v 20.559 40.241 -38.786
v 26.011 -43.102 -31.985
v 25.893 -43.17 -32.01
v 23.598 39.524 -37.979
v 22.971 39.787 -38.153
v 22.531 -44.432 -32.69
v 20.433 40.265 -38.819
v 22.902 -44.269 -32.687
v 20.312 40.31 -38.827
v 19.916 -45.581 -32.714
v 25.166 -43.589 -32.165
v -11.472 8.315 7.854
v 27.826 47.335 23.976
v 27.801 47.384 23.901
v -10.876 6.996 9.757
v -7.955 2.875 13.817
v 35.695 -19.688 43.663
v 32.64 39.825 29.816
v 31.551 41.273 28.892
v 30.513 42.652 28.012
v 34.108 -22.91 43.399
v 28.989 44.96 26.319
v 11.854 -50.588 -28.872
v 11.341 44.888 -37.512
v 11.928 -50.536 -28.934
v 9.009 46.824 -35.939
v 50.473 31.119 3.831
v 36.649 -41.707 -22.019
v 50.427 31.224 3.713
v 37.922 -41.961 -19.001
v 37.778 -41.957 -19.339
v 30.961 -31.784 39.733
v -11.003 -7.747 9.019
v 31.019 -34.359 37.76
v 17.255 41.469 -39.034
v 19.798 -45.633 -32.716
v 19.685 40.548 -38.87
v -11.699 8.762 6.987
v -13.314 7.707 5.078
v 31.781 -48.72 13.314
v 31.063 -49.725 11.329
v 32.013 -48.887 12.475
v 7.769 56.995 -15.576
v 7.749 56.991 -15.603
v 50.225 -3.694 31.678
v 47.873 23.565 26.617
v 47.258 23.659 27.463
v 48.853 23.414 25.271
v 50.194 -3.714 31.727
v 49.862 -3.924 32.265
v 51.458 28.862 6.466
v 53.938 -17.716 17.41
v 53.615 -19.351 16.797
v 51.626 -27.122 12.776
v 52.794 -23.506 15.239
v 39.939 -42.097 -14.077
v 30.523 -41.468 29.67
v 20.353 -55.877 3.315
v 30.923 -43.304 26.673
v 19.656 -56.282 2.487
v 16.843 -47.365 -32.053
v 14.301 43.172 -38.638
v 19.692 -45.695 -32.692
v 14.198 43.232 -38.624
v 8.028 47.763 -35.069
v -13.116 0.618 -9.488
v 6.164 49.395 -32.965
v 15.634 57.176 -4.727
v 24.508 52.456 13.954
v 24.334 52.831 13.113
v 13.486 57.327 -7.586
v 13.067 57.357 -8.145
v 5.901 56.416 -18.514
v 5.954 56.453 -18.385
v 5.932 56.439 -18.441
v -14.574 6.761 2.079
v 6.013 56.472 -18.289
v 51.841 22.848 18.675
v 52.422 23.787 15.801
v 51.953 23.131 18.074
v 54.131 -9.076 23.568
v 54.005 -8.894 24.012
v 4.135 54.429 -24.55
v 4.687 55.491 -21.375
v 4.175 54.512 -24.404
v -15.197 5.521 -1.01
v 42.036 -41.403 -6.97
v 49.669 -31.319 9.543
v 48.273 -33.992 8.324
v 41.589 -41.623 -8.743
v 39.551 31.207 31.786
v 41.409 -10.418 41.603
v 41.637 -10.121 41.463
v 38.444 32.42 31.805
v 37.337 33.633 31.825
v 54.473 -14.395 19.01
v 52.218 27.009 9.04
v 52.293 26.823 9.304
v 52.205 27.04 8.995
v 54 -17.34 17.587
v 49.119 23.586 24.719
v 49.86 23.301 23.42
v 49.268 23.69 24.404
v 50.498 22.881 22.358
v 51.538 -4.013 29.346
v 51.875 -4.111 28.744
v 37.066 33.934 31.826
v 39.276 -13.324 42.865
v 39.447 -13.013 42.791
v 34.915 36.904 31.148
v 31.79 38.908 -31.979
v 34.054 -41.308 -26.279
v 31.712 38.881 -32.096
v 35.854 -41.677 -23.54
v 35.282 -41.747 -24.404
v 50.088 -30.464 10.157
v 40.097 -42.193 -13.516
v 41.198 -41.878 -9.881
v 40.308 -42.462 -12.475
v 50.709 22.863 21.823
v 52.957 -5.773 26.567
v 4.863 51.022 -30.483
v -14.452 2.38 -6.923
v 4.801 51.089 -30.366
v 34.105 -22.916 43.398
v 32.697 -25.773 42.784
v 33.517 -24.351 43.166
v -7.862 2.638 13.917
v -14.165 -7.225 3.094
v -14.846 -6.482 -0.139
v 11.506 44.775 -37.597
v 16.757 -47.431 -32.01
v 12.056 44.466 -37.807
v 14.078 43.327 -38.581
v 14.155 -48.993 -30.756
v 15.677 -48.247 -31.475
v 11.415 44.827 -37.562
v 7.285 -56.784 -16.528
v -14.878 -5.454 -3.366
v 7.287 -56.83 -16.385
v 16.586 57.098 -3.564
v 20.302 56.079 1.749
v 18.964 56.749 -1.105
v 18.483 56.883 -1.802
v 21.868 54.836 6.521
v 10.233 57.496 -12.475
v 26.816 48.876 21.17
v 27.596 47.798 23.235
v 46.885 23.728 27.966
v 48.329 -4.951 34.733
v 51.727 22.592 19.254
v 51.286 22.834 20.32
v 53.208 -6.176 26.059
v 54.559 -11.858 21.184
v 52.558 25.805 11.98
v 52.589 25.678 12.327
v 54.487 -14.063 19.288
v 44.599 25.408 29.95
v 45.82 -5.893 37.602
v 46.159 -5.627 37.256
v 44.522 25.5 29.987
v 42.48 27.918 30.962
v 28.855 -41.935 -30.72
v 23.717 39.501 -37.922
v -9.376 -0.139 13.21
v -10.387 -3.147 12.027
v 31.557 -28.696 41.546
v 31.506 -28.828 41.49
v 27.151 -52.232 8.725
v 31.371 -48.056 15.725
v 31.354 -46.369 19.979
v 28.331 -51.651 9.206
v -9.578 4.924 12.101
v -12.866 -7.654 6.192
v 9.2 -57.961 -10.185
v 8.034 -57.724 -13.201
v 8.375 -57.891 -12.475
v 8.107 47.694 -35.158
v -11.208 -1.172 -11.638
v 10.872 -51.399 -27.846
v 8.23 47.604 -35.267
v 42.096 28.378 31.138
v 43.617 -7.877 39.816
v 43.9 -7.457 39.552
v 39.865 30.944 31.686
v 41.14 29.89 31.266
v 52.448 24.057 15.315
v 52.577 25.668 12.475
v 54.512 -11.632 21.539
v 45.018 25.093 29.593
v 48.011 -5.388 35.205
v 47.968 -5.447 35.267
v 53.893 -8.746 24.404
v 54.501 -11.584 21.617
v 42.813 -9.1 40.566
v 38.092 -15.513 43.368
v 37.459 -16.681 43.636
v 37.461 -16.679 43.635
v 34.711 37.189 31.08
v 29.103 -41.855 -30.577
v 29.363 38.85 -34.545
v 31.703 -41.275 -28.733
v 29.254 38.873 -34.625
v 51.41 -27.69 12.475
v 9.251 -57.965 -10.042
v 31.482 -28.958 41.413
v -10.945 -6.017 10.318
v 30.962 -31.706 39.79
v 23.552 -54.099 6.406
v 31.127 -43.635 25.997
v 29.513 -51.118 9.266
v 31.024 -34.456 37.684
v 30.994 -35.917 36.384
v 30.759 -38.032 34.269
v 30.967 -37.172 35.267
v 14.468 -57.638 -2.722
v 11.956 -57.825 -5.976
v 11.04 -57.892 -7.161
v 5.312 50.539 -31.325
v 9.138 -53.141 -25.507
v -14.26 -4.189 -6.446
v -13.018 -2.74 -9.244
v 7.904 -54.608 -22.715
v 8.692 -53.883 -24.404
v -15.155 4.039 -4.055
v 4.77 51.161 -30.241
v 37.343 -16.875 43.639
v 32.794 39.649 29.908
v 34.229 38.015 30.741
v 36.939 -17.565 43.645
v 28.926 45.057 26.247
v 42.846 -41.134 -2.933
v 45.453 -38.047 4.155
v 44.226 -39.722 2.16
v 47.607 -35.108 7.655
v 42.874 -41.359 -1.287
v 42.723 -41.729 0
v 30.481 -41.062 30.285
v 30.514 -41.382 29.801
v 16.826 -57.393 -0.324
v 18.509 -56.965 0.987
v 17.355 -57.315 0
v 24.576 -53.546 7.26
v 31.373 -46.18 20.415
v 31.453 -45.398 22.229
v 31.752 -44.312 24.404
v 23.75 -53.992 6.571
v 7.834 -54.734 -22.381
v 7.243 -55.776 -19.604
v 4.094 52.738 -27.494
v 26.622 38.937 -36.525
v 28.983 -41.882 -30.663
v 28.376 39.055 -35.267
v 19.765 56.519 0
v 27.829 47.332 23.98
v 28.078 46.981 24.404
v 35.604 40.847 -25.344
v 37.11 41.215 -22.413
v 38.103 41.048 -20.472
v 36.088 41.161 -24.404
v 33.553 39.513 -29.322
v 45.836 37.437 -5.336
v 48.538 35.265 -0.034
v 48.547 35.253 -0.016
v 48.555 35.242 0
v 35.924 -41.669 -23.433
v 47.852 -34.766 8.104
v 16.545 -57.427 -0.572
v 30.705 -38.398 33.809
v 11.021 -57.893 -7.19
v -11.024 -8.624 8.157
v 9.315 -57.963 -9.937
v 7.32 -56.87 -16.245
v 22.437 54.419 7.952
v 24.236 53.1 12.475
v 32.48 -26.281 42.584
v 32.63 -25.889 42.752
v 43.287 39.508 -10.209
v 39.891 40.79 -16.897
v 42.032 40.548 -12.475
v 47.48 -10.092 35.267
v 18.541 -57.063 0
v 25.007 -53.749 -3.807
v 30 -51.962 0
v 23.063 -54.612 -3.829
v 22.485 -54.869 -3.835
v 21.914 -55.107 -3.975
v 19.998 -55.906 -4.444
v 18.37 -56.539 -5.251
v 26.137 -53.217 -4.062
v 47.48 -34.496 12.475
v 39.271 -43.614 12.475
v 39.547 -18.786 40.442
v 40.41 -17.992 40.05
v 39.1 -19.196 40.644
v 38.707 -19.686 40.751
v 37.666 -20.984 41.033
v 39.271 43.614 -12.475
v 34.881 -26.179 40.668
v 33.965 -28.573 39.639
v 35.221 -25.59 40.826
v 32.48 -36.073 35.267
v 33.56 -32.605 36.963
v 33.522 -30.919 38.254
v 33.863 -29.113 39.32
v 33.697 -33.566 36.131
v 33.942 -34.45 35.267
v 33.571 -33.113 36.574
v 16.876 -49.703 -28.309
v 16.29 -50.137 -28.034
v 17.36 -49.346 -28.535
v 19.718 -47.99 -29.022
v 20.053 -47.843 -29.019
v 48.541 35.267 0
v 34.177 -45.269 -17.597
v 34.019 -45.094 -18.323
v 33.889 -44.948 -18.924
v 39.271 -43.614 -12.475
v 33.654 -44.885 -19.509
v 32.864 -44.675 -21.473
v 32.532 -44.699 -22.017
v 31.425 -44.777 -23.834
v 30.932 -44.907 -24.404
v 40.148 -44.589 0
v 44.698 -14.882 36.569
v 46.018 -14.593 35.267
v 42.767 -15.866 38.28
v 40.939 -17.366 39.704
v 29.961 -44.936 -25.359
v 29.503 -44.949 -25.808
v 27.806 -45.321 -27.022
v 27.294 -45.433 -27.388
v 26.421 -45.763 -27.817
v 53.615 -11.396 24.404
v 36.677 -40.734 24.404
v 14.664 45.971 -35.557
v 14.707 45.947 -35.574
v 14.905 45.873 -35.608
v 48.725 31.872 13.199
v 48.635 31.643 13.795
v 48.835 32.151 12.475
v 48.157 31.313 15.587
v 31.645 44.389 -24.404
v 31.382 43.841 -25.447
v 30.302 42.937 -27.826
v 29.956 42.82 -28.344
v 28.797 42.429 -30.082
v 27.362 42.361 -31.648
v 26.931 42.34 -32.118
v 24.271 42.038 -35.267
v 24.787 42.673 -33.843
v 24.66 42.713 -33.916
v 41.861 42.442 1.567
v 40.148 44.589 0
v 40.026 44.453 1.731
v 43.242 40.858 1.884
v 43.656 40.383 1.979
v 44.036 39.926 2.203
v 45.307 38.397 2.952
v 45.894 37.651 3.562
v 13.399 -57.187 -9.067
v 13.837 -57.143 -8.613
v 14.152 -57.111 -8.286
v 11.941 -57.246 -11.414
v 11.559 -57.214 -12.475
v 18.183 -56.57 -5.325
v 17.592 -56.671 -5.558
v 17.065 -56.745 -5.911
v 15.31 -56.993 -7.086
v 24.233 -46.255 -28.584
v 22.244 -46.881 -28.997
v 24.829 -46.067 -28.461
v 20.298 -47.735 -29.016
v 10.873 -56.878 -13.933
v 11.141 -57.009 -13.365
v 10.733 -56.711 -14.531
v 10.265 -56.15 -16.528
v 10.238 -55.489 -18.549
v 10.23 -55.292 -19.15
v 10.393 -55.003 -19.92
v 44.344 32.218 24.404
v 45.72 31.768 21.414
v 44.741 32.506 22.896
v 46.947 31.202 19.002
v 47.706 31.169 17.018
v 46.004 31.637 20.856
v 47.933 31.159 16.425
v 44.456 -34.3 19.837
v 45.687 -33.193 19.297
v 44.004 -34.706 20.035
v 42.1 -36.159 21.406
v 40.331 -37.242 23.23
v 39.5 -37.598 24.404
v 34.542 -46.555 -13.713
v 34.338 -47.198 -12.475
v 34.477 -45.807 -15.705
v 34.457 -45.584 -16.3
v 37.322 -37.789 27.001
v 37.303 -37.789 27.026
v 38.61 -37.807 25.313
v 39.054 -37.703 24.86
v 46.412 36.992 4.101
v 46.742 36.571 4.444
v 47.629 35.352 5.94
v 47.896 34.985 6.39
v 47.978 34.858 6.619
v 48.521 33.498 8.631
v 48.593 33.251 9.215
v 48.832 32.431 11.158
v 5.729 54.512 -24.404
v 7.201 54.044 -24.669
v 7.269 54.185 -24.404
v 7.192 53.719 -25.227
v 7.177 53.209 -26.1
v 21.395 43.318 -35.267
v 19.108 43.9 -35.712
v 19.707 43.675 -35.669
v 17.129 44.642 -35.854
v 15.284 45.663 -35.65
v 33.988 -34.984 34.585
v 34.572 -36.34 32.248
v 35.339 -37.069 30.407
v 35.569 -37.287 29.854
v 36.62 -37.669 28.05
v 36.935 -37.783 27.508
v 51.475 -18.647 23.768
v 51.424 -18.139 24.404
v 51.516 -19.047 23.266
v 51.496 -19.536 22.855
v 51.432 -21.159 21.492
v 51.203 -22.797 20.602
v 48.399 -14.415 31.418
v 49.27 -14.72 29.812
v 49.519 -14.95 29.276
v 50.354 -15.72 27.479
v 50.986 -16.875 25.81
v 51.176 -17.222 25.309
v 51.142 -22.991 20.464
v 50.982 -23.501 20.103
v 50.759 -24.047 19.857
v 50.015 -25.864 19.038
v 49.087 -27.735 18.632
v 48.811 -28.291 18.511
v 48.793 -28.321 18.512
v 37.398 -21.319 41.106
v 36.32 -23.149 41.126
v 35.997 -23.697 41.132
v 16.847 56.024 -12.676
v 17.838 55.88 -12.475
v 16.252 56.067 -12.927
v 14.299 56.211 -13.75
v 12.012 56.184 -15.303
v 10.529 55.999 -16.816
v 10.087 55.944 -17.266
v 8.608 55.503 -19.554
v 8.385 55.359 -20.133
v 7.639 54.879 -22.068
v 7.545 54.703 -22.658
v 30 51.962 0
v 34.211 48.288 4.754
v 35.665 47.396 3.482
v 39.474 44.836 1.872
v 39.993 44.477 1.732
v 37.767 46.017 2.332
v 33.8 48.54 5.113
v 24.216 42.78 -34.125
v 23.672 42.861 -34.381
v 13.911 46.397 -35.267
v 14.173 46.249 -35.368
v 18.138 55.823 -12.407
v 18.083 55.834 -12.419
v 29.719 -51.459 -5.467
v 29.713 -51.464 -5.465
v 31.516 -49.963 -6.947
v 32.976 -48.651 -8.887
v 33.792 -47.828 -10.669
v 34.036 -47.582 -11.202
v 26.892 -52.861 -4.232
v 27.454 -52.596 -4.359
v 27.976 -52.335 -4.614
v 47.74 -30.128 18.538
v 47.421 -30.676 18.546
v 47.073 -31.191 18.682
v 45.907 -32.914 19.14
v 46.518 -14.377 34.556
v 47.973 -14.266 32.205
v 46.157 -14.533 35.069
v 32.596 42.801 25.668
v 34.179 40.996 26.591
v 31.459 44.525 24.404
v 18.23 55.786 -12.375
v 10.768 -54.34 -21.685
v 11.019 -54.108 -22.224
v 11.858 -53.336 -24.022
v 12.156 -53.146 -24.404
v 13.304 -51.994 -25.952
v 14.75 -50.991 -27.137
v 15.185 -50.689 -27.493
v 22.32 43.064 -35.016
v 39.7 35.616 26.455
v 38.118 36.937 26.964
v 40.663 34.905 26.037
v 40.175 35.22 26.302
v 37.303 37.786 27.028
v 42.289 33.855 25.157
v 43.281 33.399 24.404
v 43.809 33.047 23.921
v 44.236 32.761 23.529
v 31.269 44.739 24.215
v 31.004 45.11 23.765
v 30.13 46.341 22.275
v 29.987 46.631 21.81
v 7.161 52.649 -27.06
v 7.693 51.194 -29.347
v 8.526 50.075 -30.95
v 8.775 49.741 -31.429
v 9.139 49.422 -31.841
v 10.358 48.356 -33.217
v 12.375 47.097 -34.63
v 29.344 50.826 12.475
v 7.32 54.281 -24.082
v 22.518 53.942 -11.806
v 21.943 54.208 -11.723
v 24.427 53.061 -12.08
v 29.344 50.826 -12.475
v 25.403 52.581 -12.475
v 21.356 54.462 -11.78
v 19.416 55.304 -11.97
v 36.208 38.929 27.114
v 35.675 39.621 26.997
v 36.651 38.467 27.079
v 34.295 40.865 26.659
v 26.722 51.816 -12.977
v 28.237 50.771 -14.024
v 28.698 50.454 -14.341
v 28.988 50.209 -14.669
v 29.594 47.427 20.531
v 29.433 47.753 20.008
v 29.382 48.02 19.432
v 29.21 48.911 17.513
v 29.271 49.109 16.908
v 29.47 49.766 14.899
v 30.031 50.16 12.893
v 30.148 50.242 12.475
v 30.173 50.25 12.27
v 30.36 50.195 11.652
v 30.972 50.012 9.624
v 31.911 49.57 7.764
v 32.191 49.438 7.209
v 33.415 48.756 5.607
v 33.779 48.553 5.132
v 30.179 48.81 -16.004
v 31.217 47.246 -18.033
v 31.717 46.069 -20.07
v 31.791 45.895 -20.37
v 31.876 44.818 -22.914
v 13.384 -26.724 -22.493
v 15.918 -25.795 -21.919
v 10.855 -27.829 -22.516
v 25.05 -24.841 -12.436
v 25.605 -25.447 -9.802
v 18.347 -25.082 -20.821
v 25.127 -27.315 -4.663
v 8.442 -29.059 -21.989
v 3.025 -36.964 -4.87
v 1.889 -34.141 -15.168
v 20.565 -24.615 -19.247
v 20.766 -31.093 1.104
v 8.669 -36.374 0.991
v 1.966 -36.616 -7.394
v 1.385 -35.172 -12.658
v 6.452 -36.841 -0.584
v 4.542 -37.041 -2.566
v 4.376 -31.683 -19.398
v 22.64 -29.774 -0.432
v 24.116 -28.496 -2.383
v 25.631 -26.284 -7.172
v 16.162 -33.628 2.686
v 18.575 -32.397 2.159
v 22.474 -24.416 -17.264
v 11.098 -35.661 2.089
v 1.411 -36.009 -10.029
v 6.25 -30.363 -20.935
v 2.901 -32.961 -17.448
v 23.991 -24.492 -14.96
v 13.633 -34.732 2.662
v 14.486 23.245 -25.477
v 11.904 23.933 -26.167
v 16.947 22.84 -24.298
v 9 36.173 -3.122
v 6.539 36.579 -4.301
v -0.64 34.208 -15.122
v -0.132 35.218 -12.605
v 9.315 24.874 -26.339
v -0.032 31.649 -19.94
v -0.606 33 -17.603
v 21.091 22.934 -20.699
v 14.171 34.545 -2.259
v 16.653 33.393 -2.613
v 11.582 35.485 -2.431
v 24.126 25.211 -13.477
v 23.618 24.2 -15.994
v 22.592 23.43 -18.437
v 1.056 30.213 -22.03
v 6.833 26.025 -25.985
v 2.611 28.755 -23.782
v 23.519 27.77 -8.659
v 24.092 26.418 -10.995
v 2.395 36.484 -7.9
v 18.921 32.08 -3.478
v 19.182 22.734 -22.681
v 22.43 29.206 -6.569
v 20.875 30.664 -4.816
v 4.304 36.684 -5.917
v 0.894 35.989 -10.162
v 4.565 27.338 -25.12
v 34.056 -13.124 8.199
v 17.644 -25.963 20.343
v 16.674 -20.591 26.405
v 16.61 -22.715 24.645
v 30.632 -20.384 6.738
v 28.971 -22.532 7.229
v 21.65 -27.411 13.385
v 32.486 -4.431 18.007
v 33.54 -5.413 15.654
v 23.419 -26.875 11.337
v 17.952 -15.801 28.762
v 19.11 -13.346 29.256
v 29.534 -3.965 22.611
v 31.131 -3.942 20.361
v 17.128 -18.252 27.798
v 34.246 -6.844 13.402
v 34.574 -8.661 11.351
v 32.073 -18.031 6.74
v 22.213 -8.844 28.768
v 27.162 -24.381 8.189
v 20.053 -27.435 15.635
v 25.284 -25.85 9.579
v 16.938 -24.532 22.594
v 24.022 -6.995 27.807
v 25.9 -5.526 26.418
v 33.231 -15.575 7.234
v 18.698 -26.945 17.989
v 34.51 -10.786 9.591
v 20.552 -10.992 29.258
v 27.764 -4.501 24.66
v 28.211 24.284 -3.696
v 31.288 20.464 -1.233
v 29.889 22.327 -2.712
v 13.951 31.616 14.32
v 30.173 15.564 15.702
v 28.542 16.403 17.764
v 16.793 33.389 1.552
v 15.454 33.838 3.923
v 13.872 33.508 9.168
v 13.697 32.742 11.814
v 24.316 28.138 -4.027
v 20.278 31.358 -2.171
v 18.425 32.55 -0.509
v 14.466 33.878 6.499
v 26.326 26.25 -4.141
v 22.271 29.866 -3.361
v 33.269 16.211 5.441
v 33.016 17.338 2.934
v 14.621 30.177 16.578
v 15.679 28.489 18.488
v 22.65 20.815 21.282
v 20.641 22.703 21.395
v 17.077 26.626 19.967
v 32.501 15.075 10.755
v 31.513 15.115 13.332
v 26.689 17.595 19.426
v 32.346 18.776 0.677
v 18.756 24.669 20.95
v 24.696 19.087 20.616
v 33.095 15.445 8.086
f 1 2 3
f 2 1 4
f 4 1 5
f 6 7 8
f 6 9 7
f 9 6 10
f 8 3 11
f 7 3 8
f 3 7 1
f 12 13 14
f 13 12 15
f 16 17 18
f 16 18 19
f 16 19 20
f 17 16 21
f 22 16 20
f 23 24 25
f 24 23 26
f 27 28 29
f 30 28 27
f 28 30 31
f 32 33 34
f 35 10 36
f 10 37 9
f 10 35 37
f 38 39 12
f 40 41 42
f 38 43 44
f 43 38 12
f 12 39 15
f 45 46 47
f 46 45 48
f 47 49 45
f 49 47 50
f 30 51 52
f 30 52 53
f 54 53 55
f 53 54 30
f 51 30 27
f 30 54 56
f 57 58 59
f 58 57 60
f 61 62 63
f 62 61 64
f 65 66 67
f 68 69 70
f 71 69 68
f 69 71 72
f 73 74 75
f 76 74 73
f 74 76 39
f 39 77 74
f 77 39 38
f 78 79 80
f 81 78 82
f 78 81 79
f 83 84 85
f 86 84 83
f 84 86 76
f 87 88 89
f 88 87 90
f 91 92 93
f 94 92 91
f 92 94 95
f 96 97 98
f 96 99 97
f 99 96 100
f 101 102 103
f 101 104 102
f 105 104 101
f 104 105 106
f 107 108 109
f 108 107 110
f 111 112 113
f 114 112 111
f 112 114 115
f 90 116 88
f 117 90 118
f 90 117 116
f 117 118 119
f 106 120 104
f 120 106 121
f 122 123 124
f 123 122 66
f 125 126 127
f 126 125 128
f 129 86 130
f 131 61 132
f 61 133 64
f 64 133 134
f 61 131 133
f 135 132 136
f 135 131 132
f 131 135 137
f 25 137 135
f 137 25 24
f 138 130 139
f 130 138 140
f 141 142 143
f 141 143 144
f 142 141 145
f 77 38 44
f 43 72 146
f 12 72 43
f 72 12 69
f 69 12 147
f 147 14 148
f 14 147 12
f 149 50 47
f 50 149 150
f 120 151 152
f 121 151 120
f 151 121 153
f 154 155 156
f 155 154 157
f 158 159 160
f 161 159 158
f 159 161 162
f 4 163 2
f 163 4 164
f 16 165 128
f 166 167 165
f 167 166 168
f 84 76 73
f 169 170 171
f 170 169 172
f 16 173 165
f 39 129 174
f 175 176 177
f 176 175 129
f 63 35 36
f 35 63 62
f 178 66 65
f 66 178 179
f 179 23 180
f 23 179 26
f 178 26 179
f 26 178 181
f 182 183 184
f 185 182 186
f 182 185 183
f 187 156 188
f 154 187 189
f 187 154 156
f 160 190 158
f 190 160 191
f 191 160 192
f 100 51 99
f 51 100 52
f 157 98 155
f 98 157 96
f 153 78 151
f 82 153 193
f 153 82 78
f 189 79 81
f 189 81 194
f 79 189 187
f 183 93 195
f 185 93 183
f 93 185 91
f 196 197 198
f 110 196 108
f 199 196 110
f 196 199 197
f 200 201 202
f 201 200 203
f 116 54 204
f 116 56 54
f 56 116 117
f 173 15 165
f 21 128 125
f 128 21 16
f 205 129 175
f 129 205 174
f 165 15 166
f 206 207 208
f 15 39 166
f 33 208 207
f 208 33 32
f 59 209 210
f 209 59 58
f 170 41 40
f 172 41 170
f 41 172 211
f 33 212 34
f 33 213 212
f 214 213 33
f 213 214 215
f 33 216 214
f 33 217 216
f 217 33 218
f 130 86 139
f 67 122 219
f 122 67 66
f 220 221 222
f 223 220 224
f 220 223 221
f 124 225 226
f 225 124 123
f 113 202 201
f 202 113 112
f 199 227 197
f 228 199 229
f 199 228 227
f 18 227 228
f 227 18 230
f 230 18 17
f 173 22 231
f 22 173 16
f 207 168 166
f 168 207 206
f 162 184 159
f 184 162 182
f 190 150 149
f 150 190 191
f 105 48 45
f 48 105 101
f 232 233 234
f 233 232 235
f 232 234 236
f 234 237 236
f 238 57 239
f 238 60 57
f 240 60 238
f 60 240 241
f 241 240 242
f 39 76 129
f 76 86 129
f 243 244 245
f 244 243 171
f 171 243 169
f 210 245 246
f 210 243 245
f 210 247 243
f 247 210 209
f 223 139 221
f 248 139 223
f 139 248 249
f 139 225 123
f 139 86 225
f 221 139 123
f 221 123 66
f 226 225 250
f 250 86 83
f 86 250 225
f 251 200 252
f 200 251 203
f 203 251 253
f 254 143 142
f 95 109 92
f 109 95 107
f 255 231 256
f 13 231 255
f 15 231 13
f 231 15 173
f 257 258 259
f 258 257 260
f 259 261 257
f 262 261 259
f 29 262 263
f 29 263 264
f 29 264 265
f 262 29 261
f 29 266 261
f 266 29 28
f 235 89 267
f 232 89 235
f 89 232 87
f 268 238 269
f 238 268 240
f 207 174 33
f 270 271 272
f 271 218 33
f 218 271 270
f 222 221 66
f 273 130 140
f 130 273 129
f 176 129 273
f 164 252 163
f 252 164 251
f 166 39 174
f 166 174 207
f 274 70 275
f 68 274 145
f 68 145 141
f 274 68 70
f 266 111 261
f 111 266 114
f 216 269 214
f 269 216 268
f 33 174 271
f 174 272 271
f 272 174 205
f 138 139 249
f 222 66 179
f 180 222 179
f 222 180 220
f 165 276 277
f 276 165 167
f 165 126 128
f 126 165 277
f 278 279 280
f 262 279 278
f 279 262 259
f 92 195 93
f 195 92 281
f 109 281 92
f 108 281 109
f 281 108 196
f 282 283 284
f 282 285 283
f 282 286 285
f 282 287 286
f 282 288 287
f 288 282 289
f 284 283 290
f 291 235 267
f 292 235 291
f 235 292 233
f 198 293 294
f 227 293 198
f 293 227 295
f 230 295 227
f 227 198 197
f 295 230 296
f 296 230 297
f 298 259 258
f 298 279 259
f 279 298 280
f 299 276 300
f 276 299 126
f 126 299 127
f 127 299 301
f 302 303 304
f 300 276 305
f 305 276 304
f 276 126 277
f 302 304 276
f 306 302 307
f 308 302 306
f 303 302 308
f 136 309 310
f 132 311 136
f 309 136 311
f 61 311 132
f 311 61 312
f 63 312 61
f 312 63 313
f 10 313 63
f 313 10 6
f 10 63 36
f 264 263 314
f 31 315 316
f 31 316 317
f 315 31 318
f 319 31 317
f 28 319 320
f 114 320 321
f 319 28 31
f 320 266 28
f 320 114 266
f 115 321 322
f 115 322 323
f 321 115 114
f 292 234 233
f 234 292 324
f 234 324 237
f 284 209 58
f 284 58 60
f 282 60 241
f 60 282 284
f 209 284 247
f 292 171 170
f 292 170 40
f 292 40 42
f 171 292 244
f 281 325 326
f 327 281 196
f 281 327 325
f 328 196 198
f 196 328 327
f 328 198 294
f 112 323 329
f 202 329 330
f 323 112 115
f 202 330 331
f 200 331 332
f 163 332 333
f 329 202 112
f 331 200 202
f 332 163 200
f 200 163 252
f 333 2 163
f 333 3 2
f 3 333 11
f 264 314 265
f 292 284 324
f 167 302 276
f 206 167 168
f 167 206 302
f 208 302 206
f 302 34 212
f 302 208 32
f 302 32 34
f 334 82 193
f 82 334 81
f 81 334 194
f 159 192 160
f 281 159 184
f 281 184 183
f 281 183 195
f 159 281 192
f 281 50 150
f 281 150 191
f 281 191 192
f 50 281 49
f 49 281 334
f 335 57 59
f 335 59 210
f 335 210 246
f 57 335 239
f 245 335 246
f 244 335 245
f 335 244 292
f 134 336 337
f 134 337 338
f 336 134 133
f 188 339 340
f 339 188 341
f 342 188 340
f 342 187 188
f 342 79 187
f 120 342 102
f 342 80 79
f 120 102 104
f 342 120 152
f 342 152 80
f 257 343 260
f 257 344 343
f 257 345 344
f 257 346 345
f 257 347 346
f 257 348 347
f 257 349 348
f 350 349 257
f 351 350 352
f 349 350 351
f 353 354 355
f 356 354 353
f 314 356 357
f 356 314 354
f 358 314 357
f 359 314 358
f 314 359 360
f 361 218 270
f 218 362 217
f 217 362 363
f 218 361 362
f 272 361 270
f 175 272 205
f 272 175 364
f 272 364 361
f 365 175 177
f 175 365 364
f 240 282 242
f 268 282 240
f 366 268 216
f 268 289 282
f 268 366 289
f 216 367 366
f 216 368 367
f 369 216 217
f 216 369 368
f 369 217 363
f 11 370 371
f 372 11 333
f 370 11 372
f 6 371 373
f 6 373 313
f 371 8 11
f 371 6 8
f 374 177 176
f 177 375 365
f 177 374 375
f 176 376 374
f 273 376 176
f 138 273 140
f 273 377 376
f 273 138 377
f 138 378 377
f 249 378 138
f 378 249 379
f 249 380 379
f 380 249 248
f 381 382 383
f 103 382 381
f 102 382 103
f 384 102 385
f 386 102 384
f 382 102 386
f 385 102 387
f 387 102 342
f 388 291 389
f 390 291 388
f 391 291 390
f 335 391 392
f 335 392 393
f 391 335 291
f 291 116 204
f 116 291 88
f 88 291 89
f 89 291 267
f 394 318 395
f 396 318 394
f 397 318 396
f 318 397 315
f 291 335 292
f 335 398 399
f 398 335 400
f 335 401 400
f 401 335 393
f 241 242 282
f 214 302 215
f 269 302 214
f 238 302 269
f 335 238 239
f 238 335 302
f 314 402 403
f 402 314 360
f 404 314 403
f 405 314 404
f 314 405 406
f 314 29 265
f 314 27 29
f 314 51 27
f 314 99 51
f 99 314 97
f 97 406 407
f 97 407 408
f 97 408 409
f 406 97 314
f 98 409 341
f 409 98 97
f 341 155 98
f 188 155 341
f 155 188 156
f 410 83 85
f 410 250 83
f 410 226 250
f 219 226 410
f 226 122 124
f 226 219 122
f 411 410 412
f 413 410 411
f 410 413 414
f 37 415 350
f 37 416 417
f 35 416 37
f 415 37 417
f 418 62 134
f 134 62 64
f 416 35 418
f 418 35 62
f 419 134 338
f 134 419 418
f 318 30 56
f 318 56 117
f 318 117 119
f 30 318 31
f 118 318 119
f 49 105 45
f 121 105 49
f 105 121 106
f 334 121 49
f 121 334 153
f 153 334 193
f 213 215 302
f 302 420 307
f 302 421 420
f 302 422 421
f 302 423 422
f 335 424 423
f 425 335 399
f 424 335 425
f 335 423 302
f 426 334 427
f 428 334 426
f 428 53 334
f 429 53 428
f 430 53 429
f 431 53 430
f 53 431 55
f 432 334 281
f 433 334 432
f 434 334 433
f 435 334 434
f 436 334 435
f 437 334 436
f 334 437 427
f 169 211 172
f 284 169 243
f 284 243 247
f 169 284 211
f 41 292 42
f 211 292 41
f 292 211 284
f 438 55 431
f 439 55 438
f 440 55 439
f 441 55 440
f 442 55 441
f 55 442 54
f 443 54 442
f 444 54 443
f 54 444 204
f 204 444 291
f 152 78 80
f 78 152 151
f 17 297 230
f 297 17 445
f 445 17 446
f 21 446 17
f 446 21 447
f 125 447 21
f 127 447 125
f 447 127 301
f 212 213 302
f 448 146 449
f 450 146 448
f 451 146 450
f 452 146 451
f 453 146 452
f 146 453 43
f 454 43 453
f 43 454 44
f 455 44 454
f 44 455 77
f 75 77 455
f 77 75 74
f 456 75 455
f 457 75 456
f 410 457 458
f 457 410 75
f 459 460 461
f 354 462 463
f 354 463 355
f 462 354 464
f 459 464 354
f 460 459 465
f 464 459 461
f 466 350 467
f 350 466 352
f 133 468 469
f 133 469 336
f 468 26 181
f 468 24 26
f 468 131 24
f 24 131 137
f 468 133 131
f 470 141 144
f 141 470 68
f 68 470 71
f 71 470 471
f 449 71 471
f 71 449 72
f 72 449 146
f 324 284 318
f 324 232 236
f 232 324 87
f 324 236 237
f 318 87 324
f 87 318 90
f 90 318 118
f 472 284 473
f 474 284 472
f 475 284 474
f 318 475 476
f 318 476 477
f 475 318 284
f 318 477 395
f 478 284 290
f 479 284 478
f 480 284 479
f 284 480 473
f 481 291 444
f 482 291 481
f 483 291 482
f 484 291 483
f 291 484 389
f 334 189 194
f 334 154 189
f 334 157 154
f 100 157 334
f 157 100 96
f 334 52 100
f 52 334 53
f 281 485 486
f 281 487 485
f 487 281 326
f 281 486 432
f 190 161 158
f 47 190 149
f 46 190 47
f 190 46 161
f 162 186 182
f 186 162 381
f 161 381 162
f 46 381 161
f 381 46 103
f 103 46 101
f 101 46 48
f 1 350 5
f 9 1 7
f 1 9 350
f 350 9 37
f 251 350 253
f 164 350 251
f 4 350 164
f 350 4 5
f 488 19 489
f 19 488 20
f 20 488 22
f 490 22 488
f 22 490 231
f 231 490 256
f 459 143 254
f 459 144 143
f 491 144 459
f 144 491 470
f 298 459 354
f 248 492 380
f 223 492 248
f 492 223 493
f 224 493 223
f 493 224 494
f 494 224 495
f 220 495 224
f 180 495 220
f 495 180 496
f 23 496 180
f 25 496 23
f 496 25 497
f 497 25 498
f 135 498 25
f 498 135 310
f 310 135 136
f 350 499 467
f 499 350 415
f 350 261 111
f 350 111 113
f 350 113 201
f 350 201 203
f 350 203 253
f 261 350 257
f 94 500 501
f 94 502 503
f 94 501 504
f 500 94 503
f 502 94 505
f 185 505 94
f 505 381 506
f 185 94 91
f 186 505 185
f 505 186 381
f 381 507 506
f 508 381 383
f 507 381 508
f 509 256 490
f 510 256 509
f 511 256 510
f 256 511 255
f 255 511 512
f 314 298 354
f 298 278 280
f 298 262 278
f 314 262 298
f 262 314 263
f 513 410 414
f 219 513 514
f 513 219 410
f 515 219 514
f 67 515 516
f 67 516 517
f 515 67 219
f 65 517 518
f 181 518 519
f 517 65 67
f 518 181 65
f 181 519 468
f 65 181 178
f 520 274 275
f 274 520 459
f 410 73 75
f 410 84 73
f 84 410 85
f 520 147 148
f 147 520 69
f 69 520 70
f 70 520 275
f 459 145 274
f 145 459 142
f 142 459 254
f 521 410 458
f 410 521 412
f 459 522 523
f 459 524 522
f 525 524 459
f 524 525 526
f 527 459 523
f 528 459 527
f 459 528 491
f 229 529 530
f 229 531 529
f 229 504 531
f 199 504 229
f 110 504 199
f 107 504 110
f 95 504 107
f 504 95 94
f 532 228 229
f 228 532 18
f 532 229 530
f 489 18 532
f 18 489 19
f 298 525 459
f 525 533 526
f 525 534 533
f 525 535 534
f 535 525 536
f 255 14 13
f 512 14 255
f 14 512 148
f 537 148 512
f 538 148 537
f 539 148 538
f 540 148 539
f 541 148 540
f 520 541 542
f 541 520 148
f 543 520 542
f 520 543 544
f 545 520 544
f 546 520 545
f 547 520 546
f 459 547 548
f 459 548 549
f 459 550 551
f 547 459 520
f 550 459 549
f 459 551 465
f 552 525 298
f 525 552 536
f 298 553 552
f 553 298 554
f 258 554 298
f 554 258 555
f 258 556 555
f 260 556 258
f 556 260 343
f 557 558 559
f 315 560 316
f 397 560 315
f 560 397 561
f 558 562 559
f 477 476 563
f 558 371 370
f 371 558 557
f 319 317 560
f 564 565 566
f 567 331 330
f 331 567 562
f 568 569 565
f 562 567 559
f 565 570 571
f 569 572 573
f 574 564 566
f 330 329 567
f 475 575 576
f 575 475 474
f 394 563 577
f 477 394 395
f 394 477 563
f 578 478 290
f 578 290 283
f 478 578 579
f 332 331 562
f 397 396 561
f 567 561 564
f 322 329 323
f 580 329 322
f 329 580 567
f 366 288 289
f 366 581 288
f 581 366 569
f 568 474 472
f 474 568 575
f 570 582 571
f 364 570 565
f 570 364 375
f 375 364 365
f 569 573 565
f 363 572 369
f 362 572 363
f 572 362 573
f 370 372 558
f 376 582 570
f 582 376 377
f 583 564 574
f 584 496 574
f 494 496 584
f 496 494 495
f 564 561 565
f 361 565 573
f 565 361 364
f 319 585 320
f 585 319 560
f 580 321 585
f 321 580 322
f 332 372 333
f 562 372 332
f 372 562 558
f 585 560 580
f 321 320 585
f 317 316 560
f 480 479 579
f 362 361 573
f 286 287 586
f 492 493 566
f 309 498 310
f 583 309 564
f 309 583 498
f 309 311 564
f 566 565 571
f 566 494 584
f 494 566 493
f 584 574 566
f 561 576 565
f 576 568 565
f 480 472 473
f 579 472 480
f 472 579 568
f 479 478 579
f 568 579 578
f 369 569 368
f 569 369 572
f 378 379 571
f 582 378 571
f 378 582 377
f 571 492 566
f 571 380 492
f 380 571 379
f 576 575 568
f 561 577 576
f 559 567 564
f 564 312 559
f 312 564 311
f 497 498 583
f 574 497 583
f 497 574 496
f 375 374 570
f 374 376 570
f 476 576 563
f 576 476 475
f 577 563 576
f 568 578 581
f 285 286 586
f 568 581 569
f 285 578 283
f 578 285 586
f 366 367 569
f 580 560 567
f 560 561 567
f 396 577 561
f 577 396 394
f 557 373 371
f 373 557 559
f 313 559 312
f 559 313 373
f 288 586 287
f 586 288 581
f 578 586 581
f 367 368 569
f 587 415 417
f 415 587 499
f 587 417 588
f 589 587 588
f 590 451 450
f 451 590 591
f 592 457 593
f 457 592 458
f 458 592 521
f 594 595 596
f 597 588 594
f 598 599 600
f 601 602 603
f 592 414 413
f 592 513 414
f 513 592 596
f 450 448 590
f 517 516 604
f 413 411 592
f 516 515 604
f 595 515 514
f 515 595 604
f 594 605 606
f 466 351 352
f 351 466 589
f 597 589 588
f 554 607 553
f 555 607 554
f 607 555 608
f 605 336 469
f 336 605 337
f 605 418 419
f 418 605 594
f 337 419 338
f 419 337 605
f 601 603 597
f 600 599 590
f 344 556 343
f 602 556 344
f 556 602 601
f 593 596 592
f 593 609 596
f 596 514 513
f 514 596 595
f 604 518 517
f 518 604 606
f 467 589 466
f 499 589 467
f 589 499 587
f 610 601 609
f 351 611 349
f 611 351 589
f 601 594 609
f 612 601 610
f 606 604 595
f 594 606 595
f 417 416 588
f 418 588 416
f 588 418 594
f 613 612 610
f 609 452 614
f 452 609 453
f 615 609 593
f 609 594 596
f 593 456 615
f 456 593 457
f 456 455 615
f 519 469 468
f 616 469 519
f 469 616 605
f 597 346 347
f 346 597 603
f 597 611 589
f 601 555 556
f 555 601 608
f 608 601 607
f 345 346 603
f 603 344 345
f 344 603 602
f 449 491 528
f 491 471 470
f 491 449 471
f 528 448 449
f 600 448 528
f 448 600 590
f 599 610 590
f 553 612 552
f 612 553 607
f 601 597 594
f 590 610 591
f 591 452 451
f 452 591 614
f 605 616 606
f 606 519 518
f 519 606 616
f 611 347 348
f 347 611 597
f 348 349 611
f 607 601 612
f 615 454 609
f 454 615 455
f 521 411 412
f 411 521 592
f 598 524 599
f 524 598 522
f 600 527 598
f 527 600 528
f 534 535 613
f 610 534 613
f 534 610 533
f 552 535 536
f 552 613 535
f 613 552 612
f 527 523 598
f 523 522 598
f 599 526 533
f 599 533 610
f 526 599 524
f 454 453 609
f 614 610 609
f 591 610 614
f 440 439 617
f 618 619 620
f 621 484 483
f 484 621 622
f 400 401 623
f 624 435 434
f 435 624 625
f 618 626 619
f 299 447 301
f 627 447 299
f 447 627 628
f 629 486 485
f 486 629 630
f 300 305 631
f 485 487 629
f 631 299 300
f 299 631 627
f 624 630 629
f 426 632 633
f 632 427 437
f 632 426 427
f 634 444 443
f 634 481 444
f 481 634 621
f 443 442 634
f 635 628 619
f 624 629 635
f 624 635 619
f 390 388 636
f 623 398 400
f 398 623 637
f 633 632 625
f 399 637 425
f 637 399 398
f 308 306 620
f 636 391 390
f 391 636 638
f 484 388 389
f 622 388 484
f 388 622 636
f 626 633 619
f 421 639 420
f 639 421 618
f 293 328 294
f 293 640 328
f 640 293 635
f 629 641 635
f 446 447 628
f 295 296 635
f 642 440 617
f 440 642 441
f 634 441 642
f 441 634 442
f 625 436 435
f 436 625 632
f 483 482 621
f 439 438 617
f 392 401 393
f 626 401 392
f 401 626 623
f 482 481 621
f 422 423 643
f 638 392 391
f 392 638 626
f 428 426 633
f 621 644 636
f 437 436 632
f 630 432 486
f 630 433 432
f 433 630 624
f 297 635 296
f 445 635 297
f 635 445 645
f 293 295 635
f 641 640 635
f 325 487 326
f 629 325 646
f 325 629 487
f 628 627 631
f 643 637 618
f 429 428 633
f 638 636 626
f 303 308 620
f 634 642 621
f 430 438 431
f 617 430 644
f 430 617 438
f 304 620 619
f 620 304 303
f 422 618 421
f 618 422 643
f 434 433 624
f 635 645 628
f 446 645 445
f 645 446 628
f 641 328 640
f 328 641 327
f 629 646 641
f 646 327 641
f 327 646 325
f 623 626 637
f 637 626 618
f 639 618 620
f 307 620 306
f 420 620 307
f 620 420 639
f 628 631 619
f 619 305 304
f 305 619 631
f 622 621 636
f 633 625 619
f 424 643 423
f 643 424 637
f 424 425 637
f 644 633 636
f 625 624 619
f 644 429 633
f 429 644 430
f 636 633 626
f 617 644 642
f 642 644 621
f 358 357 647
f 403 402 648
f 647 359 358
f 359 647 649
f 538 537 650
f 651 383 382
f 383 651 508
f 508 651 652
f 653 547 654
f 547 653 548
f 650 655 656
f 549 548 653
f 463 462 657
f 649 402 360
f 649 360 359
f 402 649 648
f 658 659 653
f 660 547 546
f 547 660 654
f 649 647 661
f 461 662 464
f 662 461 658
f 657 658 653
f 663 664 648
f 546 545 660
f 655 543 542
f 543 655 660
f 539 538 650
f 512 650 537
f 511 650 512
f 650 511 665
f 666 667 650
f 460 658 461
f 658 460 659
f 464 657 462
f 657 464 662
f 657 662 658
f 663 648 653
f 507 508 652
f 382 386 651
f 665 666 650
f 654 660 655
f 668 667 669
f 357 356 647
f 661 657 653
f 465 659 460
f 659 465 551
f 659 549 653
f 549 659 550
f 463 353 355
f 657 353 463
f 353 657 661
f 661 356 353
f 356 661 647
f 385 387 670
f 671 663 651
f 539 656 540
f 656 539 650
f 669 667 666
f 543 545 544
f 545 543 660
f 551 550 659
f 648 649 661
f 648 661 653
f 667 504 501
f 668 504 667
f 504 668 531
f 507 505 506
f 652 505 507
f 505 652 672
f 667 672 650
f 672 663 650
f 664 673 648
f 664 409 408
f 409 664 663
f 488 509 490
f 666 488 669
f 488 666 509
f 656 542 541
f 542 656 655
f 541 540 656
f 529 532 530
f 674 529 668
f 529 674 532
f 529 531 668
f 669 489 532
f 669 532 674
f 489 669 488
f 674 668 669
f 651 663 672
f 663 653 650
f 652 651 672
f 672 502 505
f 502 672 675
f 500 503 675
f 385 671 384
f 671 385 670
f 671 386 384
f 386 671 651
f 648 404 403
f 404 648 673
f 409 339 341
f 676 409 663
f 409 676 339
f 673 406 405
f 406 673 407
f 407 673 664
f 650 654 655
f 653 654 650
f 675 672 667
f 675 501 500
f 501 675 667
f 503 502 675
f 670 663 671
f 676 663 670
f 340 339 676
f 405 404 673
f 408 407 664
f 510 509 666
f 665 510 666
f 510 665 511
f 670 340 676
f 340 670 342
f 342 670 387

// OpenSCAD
difference() {
	intersection() {
		hull() {
			rotate(a = -44.0760747966, v = [0.0723183475, -0.6918434180, 0.0000000000]) {
				rotate(a = -90.0000000000, v = [-0.8660254038, -0.5000000000, 0.0000000000]) {
					cylinder(h = 60, r = 16.2000000000);
				}
			}
			rotate(a = -44.0760747966, v = [0.0723183475, -0.6918434180, 0.0000000000]) {
				rotate(a = -90.0000000000, v = [0.8660254038, -0.5000000000, 0.0000000000]) {
					cylinder(h = 60, r = 16.2000000000);
				}
			}
			rotate(a = -44.0760747966, v = [0.0723183475, -0.6918434180, 0.0000000000]) {
				rotate(a = -32.5529951665, v = [-0.5053465272, -0.1848090856, 0.0000000000]) {
					cylinder(h = 60, r = 16.2000000000);
				}
			}
			rotate(a = -44.0760747966, v = [0.0723183475, -0.6918434180, 0.0000000000]) {
				rotate(a = -46.2229214243, v = [0.6598396710, -0.2931708240, 0.0000000000]) {
					cylinder(h = 60, r = 16.2000000000);
				}
			}
		}
		sphere(r = 60);
	}
	union() {
		rotate(a = -44.0760747966, v = [0.0723183475, -0.6918434180, 0.0000000000]) {
			rotate(a = -90.0000000000, v = [-0.8660254038, -0.5000000000, 0.0000000000]) {
				translate(v = [0, 0, 35]) {
					cylinder(h = 100, r = 13.2000000000);
				}
			}
		}
		rotate(a = -44.0760747966, v = [0.0723183475, -0.6918434180, 0.0000000000]) {
			rotate(a = -90.0000000000, v = [0.8660254038, -0.5000000000, 0.0000000000]) {
				translate(v = [0, 0, 35]) {
					cylinder(h = 100, r = 13.2000000000);
				}
			}
		}
		rotate(a = -44.0760747966, v = [0.0723183475, -0.6918434180, 0.0000000000]) {
			rotate(a = -32.5529951665, v = [-0.5053465272, -0.1848090856, 0.0000000000]) {
				translate(v = [0, 0, 35]) {
					cylinder(h = 100, r = 13.2000000000);
				}
			}
		}
		rotate(a = -44.0760747966, v = [0.0723183475, -0.6918434180, 0.0000000000]) {
			rotate(a = -46.2229214243, v = [0.6598396710, -0.2931708240, 0.0000000000]) {
				translate(v = [0, 0, 35]) {
					cylinder(h = 100, r = 13.2000000000);
				}
			}
		}
	}
}
